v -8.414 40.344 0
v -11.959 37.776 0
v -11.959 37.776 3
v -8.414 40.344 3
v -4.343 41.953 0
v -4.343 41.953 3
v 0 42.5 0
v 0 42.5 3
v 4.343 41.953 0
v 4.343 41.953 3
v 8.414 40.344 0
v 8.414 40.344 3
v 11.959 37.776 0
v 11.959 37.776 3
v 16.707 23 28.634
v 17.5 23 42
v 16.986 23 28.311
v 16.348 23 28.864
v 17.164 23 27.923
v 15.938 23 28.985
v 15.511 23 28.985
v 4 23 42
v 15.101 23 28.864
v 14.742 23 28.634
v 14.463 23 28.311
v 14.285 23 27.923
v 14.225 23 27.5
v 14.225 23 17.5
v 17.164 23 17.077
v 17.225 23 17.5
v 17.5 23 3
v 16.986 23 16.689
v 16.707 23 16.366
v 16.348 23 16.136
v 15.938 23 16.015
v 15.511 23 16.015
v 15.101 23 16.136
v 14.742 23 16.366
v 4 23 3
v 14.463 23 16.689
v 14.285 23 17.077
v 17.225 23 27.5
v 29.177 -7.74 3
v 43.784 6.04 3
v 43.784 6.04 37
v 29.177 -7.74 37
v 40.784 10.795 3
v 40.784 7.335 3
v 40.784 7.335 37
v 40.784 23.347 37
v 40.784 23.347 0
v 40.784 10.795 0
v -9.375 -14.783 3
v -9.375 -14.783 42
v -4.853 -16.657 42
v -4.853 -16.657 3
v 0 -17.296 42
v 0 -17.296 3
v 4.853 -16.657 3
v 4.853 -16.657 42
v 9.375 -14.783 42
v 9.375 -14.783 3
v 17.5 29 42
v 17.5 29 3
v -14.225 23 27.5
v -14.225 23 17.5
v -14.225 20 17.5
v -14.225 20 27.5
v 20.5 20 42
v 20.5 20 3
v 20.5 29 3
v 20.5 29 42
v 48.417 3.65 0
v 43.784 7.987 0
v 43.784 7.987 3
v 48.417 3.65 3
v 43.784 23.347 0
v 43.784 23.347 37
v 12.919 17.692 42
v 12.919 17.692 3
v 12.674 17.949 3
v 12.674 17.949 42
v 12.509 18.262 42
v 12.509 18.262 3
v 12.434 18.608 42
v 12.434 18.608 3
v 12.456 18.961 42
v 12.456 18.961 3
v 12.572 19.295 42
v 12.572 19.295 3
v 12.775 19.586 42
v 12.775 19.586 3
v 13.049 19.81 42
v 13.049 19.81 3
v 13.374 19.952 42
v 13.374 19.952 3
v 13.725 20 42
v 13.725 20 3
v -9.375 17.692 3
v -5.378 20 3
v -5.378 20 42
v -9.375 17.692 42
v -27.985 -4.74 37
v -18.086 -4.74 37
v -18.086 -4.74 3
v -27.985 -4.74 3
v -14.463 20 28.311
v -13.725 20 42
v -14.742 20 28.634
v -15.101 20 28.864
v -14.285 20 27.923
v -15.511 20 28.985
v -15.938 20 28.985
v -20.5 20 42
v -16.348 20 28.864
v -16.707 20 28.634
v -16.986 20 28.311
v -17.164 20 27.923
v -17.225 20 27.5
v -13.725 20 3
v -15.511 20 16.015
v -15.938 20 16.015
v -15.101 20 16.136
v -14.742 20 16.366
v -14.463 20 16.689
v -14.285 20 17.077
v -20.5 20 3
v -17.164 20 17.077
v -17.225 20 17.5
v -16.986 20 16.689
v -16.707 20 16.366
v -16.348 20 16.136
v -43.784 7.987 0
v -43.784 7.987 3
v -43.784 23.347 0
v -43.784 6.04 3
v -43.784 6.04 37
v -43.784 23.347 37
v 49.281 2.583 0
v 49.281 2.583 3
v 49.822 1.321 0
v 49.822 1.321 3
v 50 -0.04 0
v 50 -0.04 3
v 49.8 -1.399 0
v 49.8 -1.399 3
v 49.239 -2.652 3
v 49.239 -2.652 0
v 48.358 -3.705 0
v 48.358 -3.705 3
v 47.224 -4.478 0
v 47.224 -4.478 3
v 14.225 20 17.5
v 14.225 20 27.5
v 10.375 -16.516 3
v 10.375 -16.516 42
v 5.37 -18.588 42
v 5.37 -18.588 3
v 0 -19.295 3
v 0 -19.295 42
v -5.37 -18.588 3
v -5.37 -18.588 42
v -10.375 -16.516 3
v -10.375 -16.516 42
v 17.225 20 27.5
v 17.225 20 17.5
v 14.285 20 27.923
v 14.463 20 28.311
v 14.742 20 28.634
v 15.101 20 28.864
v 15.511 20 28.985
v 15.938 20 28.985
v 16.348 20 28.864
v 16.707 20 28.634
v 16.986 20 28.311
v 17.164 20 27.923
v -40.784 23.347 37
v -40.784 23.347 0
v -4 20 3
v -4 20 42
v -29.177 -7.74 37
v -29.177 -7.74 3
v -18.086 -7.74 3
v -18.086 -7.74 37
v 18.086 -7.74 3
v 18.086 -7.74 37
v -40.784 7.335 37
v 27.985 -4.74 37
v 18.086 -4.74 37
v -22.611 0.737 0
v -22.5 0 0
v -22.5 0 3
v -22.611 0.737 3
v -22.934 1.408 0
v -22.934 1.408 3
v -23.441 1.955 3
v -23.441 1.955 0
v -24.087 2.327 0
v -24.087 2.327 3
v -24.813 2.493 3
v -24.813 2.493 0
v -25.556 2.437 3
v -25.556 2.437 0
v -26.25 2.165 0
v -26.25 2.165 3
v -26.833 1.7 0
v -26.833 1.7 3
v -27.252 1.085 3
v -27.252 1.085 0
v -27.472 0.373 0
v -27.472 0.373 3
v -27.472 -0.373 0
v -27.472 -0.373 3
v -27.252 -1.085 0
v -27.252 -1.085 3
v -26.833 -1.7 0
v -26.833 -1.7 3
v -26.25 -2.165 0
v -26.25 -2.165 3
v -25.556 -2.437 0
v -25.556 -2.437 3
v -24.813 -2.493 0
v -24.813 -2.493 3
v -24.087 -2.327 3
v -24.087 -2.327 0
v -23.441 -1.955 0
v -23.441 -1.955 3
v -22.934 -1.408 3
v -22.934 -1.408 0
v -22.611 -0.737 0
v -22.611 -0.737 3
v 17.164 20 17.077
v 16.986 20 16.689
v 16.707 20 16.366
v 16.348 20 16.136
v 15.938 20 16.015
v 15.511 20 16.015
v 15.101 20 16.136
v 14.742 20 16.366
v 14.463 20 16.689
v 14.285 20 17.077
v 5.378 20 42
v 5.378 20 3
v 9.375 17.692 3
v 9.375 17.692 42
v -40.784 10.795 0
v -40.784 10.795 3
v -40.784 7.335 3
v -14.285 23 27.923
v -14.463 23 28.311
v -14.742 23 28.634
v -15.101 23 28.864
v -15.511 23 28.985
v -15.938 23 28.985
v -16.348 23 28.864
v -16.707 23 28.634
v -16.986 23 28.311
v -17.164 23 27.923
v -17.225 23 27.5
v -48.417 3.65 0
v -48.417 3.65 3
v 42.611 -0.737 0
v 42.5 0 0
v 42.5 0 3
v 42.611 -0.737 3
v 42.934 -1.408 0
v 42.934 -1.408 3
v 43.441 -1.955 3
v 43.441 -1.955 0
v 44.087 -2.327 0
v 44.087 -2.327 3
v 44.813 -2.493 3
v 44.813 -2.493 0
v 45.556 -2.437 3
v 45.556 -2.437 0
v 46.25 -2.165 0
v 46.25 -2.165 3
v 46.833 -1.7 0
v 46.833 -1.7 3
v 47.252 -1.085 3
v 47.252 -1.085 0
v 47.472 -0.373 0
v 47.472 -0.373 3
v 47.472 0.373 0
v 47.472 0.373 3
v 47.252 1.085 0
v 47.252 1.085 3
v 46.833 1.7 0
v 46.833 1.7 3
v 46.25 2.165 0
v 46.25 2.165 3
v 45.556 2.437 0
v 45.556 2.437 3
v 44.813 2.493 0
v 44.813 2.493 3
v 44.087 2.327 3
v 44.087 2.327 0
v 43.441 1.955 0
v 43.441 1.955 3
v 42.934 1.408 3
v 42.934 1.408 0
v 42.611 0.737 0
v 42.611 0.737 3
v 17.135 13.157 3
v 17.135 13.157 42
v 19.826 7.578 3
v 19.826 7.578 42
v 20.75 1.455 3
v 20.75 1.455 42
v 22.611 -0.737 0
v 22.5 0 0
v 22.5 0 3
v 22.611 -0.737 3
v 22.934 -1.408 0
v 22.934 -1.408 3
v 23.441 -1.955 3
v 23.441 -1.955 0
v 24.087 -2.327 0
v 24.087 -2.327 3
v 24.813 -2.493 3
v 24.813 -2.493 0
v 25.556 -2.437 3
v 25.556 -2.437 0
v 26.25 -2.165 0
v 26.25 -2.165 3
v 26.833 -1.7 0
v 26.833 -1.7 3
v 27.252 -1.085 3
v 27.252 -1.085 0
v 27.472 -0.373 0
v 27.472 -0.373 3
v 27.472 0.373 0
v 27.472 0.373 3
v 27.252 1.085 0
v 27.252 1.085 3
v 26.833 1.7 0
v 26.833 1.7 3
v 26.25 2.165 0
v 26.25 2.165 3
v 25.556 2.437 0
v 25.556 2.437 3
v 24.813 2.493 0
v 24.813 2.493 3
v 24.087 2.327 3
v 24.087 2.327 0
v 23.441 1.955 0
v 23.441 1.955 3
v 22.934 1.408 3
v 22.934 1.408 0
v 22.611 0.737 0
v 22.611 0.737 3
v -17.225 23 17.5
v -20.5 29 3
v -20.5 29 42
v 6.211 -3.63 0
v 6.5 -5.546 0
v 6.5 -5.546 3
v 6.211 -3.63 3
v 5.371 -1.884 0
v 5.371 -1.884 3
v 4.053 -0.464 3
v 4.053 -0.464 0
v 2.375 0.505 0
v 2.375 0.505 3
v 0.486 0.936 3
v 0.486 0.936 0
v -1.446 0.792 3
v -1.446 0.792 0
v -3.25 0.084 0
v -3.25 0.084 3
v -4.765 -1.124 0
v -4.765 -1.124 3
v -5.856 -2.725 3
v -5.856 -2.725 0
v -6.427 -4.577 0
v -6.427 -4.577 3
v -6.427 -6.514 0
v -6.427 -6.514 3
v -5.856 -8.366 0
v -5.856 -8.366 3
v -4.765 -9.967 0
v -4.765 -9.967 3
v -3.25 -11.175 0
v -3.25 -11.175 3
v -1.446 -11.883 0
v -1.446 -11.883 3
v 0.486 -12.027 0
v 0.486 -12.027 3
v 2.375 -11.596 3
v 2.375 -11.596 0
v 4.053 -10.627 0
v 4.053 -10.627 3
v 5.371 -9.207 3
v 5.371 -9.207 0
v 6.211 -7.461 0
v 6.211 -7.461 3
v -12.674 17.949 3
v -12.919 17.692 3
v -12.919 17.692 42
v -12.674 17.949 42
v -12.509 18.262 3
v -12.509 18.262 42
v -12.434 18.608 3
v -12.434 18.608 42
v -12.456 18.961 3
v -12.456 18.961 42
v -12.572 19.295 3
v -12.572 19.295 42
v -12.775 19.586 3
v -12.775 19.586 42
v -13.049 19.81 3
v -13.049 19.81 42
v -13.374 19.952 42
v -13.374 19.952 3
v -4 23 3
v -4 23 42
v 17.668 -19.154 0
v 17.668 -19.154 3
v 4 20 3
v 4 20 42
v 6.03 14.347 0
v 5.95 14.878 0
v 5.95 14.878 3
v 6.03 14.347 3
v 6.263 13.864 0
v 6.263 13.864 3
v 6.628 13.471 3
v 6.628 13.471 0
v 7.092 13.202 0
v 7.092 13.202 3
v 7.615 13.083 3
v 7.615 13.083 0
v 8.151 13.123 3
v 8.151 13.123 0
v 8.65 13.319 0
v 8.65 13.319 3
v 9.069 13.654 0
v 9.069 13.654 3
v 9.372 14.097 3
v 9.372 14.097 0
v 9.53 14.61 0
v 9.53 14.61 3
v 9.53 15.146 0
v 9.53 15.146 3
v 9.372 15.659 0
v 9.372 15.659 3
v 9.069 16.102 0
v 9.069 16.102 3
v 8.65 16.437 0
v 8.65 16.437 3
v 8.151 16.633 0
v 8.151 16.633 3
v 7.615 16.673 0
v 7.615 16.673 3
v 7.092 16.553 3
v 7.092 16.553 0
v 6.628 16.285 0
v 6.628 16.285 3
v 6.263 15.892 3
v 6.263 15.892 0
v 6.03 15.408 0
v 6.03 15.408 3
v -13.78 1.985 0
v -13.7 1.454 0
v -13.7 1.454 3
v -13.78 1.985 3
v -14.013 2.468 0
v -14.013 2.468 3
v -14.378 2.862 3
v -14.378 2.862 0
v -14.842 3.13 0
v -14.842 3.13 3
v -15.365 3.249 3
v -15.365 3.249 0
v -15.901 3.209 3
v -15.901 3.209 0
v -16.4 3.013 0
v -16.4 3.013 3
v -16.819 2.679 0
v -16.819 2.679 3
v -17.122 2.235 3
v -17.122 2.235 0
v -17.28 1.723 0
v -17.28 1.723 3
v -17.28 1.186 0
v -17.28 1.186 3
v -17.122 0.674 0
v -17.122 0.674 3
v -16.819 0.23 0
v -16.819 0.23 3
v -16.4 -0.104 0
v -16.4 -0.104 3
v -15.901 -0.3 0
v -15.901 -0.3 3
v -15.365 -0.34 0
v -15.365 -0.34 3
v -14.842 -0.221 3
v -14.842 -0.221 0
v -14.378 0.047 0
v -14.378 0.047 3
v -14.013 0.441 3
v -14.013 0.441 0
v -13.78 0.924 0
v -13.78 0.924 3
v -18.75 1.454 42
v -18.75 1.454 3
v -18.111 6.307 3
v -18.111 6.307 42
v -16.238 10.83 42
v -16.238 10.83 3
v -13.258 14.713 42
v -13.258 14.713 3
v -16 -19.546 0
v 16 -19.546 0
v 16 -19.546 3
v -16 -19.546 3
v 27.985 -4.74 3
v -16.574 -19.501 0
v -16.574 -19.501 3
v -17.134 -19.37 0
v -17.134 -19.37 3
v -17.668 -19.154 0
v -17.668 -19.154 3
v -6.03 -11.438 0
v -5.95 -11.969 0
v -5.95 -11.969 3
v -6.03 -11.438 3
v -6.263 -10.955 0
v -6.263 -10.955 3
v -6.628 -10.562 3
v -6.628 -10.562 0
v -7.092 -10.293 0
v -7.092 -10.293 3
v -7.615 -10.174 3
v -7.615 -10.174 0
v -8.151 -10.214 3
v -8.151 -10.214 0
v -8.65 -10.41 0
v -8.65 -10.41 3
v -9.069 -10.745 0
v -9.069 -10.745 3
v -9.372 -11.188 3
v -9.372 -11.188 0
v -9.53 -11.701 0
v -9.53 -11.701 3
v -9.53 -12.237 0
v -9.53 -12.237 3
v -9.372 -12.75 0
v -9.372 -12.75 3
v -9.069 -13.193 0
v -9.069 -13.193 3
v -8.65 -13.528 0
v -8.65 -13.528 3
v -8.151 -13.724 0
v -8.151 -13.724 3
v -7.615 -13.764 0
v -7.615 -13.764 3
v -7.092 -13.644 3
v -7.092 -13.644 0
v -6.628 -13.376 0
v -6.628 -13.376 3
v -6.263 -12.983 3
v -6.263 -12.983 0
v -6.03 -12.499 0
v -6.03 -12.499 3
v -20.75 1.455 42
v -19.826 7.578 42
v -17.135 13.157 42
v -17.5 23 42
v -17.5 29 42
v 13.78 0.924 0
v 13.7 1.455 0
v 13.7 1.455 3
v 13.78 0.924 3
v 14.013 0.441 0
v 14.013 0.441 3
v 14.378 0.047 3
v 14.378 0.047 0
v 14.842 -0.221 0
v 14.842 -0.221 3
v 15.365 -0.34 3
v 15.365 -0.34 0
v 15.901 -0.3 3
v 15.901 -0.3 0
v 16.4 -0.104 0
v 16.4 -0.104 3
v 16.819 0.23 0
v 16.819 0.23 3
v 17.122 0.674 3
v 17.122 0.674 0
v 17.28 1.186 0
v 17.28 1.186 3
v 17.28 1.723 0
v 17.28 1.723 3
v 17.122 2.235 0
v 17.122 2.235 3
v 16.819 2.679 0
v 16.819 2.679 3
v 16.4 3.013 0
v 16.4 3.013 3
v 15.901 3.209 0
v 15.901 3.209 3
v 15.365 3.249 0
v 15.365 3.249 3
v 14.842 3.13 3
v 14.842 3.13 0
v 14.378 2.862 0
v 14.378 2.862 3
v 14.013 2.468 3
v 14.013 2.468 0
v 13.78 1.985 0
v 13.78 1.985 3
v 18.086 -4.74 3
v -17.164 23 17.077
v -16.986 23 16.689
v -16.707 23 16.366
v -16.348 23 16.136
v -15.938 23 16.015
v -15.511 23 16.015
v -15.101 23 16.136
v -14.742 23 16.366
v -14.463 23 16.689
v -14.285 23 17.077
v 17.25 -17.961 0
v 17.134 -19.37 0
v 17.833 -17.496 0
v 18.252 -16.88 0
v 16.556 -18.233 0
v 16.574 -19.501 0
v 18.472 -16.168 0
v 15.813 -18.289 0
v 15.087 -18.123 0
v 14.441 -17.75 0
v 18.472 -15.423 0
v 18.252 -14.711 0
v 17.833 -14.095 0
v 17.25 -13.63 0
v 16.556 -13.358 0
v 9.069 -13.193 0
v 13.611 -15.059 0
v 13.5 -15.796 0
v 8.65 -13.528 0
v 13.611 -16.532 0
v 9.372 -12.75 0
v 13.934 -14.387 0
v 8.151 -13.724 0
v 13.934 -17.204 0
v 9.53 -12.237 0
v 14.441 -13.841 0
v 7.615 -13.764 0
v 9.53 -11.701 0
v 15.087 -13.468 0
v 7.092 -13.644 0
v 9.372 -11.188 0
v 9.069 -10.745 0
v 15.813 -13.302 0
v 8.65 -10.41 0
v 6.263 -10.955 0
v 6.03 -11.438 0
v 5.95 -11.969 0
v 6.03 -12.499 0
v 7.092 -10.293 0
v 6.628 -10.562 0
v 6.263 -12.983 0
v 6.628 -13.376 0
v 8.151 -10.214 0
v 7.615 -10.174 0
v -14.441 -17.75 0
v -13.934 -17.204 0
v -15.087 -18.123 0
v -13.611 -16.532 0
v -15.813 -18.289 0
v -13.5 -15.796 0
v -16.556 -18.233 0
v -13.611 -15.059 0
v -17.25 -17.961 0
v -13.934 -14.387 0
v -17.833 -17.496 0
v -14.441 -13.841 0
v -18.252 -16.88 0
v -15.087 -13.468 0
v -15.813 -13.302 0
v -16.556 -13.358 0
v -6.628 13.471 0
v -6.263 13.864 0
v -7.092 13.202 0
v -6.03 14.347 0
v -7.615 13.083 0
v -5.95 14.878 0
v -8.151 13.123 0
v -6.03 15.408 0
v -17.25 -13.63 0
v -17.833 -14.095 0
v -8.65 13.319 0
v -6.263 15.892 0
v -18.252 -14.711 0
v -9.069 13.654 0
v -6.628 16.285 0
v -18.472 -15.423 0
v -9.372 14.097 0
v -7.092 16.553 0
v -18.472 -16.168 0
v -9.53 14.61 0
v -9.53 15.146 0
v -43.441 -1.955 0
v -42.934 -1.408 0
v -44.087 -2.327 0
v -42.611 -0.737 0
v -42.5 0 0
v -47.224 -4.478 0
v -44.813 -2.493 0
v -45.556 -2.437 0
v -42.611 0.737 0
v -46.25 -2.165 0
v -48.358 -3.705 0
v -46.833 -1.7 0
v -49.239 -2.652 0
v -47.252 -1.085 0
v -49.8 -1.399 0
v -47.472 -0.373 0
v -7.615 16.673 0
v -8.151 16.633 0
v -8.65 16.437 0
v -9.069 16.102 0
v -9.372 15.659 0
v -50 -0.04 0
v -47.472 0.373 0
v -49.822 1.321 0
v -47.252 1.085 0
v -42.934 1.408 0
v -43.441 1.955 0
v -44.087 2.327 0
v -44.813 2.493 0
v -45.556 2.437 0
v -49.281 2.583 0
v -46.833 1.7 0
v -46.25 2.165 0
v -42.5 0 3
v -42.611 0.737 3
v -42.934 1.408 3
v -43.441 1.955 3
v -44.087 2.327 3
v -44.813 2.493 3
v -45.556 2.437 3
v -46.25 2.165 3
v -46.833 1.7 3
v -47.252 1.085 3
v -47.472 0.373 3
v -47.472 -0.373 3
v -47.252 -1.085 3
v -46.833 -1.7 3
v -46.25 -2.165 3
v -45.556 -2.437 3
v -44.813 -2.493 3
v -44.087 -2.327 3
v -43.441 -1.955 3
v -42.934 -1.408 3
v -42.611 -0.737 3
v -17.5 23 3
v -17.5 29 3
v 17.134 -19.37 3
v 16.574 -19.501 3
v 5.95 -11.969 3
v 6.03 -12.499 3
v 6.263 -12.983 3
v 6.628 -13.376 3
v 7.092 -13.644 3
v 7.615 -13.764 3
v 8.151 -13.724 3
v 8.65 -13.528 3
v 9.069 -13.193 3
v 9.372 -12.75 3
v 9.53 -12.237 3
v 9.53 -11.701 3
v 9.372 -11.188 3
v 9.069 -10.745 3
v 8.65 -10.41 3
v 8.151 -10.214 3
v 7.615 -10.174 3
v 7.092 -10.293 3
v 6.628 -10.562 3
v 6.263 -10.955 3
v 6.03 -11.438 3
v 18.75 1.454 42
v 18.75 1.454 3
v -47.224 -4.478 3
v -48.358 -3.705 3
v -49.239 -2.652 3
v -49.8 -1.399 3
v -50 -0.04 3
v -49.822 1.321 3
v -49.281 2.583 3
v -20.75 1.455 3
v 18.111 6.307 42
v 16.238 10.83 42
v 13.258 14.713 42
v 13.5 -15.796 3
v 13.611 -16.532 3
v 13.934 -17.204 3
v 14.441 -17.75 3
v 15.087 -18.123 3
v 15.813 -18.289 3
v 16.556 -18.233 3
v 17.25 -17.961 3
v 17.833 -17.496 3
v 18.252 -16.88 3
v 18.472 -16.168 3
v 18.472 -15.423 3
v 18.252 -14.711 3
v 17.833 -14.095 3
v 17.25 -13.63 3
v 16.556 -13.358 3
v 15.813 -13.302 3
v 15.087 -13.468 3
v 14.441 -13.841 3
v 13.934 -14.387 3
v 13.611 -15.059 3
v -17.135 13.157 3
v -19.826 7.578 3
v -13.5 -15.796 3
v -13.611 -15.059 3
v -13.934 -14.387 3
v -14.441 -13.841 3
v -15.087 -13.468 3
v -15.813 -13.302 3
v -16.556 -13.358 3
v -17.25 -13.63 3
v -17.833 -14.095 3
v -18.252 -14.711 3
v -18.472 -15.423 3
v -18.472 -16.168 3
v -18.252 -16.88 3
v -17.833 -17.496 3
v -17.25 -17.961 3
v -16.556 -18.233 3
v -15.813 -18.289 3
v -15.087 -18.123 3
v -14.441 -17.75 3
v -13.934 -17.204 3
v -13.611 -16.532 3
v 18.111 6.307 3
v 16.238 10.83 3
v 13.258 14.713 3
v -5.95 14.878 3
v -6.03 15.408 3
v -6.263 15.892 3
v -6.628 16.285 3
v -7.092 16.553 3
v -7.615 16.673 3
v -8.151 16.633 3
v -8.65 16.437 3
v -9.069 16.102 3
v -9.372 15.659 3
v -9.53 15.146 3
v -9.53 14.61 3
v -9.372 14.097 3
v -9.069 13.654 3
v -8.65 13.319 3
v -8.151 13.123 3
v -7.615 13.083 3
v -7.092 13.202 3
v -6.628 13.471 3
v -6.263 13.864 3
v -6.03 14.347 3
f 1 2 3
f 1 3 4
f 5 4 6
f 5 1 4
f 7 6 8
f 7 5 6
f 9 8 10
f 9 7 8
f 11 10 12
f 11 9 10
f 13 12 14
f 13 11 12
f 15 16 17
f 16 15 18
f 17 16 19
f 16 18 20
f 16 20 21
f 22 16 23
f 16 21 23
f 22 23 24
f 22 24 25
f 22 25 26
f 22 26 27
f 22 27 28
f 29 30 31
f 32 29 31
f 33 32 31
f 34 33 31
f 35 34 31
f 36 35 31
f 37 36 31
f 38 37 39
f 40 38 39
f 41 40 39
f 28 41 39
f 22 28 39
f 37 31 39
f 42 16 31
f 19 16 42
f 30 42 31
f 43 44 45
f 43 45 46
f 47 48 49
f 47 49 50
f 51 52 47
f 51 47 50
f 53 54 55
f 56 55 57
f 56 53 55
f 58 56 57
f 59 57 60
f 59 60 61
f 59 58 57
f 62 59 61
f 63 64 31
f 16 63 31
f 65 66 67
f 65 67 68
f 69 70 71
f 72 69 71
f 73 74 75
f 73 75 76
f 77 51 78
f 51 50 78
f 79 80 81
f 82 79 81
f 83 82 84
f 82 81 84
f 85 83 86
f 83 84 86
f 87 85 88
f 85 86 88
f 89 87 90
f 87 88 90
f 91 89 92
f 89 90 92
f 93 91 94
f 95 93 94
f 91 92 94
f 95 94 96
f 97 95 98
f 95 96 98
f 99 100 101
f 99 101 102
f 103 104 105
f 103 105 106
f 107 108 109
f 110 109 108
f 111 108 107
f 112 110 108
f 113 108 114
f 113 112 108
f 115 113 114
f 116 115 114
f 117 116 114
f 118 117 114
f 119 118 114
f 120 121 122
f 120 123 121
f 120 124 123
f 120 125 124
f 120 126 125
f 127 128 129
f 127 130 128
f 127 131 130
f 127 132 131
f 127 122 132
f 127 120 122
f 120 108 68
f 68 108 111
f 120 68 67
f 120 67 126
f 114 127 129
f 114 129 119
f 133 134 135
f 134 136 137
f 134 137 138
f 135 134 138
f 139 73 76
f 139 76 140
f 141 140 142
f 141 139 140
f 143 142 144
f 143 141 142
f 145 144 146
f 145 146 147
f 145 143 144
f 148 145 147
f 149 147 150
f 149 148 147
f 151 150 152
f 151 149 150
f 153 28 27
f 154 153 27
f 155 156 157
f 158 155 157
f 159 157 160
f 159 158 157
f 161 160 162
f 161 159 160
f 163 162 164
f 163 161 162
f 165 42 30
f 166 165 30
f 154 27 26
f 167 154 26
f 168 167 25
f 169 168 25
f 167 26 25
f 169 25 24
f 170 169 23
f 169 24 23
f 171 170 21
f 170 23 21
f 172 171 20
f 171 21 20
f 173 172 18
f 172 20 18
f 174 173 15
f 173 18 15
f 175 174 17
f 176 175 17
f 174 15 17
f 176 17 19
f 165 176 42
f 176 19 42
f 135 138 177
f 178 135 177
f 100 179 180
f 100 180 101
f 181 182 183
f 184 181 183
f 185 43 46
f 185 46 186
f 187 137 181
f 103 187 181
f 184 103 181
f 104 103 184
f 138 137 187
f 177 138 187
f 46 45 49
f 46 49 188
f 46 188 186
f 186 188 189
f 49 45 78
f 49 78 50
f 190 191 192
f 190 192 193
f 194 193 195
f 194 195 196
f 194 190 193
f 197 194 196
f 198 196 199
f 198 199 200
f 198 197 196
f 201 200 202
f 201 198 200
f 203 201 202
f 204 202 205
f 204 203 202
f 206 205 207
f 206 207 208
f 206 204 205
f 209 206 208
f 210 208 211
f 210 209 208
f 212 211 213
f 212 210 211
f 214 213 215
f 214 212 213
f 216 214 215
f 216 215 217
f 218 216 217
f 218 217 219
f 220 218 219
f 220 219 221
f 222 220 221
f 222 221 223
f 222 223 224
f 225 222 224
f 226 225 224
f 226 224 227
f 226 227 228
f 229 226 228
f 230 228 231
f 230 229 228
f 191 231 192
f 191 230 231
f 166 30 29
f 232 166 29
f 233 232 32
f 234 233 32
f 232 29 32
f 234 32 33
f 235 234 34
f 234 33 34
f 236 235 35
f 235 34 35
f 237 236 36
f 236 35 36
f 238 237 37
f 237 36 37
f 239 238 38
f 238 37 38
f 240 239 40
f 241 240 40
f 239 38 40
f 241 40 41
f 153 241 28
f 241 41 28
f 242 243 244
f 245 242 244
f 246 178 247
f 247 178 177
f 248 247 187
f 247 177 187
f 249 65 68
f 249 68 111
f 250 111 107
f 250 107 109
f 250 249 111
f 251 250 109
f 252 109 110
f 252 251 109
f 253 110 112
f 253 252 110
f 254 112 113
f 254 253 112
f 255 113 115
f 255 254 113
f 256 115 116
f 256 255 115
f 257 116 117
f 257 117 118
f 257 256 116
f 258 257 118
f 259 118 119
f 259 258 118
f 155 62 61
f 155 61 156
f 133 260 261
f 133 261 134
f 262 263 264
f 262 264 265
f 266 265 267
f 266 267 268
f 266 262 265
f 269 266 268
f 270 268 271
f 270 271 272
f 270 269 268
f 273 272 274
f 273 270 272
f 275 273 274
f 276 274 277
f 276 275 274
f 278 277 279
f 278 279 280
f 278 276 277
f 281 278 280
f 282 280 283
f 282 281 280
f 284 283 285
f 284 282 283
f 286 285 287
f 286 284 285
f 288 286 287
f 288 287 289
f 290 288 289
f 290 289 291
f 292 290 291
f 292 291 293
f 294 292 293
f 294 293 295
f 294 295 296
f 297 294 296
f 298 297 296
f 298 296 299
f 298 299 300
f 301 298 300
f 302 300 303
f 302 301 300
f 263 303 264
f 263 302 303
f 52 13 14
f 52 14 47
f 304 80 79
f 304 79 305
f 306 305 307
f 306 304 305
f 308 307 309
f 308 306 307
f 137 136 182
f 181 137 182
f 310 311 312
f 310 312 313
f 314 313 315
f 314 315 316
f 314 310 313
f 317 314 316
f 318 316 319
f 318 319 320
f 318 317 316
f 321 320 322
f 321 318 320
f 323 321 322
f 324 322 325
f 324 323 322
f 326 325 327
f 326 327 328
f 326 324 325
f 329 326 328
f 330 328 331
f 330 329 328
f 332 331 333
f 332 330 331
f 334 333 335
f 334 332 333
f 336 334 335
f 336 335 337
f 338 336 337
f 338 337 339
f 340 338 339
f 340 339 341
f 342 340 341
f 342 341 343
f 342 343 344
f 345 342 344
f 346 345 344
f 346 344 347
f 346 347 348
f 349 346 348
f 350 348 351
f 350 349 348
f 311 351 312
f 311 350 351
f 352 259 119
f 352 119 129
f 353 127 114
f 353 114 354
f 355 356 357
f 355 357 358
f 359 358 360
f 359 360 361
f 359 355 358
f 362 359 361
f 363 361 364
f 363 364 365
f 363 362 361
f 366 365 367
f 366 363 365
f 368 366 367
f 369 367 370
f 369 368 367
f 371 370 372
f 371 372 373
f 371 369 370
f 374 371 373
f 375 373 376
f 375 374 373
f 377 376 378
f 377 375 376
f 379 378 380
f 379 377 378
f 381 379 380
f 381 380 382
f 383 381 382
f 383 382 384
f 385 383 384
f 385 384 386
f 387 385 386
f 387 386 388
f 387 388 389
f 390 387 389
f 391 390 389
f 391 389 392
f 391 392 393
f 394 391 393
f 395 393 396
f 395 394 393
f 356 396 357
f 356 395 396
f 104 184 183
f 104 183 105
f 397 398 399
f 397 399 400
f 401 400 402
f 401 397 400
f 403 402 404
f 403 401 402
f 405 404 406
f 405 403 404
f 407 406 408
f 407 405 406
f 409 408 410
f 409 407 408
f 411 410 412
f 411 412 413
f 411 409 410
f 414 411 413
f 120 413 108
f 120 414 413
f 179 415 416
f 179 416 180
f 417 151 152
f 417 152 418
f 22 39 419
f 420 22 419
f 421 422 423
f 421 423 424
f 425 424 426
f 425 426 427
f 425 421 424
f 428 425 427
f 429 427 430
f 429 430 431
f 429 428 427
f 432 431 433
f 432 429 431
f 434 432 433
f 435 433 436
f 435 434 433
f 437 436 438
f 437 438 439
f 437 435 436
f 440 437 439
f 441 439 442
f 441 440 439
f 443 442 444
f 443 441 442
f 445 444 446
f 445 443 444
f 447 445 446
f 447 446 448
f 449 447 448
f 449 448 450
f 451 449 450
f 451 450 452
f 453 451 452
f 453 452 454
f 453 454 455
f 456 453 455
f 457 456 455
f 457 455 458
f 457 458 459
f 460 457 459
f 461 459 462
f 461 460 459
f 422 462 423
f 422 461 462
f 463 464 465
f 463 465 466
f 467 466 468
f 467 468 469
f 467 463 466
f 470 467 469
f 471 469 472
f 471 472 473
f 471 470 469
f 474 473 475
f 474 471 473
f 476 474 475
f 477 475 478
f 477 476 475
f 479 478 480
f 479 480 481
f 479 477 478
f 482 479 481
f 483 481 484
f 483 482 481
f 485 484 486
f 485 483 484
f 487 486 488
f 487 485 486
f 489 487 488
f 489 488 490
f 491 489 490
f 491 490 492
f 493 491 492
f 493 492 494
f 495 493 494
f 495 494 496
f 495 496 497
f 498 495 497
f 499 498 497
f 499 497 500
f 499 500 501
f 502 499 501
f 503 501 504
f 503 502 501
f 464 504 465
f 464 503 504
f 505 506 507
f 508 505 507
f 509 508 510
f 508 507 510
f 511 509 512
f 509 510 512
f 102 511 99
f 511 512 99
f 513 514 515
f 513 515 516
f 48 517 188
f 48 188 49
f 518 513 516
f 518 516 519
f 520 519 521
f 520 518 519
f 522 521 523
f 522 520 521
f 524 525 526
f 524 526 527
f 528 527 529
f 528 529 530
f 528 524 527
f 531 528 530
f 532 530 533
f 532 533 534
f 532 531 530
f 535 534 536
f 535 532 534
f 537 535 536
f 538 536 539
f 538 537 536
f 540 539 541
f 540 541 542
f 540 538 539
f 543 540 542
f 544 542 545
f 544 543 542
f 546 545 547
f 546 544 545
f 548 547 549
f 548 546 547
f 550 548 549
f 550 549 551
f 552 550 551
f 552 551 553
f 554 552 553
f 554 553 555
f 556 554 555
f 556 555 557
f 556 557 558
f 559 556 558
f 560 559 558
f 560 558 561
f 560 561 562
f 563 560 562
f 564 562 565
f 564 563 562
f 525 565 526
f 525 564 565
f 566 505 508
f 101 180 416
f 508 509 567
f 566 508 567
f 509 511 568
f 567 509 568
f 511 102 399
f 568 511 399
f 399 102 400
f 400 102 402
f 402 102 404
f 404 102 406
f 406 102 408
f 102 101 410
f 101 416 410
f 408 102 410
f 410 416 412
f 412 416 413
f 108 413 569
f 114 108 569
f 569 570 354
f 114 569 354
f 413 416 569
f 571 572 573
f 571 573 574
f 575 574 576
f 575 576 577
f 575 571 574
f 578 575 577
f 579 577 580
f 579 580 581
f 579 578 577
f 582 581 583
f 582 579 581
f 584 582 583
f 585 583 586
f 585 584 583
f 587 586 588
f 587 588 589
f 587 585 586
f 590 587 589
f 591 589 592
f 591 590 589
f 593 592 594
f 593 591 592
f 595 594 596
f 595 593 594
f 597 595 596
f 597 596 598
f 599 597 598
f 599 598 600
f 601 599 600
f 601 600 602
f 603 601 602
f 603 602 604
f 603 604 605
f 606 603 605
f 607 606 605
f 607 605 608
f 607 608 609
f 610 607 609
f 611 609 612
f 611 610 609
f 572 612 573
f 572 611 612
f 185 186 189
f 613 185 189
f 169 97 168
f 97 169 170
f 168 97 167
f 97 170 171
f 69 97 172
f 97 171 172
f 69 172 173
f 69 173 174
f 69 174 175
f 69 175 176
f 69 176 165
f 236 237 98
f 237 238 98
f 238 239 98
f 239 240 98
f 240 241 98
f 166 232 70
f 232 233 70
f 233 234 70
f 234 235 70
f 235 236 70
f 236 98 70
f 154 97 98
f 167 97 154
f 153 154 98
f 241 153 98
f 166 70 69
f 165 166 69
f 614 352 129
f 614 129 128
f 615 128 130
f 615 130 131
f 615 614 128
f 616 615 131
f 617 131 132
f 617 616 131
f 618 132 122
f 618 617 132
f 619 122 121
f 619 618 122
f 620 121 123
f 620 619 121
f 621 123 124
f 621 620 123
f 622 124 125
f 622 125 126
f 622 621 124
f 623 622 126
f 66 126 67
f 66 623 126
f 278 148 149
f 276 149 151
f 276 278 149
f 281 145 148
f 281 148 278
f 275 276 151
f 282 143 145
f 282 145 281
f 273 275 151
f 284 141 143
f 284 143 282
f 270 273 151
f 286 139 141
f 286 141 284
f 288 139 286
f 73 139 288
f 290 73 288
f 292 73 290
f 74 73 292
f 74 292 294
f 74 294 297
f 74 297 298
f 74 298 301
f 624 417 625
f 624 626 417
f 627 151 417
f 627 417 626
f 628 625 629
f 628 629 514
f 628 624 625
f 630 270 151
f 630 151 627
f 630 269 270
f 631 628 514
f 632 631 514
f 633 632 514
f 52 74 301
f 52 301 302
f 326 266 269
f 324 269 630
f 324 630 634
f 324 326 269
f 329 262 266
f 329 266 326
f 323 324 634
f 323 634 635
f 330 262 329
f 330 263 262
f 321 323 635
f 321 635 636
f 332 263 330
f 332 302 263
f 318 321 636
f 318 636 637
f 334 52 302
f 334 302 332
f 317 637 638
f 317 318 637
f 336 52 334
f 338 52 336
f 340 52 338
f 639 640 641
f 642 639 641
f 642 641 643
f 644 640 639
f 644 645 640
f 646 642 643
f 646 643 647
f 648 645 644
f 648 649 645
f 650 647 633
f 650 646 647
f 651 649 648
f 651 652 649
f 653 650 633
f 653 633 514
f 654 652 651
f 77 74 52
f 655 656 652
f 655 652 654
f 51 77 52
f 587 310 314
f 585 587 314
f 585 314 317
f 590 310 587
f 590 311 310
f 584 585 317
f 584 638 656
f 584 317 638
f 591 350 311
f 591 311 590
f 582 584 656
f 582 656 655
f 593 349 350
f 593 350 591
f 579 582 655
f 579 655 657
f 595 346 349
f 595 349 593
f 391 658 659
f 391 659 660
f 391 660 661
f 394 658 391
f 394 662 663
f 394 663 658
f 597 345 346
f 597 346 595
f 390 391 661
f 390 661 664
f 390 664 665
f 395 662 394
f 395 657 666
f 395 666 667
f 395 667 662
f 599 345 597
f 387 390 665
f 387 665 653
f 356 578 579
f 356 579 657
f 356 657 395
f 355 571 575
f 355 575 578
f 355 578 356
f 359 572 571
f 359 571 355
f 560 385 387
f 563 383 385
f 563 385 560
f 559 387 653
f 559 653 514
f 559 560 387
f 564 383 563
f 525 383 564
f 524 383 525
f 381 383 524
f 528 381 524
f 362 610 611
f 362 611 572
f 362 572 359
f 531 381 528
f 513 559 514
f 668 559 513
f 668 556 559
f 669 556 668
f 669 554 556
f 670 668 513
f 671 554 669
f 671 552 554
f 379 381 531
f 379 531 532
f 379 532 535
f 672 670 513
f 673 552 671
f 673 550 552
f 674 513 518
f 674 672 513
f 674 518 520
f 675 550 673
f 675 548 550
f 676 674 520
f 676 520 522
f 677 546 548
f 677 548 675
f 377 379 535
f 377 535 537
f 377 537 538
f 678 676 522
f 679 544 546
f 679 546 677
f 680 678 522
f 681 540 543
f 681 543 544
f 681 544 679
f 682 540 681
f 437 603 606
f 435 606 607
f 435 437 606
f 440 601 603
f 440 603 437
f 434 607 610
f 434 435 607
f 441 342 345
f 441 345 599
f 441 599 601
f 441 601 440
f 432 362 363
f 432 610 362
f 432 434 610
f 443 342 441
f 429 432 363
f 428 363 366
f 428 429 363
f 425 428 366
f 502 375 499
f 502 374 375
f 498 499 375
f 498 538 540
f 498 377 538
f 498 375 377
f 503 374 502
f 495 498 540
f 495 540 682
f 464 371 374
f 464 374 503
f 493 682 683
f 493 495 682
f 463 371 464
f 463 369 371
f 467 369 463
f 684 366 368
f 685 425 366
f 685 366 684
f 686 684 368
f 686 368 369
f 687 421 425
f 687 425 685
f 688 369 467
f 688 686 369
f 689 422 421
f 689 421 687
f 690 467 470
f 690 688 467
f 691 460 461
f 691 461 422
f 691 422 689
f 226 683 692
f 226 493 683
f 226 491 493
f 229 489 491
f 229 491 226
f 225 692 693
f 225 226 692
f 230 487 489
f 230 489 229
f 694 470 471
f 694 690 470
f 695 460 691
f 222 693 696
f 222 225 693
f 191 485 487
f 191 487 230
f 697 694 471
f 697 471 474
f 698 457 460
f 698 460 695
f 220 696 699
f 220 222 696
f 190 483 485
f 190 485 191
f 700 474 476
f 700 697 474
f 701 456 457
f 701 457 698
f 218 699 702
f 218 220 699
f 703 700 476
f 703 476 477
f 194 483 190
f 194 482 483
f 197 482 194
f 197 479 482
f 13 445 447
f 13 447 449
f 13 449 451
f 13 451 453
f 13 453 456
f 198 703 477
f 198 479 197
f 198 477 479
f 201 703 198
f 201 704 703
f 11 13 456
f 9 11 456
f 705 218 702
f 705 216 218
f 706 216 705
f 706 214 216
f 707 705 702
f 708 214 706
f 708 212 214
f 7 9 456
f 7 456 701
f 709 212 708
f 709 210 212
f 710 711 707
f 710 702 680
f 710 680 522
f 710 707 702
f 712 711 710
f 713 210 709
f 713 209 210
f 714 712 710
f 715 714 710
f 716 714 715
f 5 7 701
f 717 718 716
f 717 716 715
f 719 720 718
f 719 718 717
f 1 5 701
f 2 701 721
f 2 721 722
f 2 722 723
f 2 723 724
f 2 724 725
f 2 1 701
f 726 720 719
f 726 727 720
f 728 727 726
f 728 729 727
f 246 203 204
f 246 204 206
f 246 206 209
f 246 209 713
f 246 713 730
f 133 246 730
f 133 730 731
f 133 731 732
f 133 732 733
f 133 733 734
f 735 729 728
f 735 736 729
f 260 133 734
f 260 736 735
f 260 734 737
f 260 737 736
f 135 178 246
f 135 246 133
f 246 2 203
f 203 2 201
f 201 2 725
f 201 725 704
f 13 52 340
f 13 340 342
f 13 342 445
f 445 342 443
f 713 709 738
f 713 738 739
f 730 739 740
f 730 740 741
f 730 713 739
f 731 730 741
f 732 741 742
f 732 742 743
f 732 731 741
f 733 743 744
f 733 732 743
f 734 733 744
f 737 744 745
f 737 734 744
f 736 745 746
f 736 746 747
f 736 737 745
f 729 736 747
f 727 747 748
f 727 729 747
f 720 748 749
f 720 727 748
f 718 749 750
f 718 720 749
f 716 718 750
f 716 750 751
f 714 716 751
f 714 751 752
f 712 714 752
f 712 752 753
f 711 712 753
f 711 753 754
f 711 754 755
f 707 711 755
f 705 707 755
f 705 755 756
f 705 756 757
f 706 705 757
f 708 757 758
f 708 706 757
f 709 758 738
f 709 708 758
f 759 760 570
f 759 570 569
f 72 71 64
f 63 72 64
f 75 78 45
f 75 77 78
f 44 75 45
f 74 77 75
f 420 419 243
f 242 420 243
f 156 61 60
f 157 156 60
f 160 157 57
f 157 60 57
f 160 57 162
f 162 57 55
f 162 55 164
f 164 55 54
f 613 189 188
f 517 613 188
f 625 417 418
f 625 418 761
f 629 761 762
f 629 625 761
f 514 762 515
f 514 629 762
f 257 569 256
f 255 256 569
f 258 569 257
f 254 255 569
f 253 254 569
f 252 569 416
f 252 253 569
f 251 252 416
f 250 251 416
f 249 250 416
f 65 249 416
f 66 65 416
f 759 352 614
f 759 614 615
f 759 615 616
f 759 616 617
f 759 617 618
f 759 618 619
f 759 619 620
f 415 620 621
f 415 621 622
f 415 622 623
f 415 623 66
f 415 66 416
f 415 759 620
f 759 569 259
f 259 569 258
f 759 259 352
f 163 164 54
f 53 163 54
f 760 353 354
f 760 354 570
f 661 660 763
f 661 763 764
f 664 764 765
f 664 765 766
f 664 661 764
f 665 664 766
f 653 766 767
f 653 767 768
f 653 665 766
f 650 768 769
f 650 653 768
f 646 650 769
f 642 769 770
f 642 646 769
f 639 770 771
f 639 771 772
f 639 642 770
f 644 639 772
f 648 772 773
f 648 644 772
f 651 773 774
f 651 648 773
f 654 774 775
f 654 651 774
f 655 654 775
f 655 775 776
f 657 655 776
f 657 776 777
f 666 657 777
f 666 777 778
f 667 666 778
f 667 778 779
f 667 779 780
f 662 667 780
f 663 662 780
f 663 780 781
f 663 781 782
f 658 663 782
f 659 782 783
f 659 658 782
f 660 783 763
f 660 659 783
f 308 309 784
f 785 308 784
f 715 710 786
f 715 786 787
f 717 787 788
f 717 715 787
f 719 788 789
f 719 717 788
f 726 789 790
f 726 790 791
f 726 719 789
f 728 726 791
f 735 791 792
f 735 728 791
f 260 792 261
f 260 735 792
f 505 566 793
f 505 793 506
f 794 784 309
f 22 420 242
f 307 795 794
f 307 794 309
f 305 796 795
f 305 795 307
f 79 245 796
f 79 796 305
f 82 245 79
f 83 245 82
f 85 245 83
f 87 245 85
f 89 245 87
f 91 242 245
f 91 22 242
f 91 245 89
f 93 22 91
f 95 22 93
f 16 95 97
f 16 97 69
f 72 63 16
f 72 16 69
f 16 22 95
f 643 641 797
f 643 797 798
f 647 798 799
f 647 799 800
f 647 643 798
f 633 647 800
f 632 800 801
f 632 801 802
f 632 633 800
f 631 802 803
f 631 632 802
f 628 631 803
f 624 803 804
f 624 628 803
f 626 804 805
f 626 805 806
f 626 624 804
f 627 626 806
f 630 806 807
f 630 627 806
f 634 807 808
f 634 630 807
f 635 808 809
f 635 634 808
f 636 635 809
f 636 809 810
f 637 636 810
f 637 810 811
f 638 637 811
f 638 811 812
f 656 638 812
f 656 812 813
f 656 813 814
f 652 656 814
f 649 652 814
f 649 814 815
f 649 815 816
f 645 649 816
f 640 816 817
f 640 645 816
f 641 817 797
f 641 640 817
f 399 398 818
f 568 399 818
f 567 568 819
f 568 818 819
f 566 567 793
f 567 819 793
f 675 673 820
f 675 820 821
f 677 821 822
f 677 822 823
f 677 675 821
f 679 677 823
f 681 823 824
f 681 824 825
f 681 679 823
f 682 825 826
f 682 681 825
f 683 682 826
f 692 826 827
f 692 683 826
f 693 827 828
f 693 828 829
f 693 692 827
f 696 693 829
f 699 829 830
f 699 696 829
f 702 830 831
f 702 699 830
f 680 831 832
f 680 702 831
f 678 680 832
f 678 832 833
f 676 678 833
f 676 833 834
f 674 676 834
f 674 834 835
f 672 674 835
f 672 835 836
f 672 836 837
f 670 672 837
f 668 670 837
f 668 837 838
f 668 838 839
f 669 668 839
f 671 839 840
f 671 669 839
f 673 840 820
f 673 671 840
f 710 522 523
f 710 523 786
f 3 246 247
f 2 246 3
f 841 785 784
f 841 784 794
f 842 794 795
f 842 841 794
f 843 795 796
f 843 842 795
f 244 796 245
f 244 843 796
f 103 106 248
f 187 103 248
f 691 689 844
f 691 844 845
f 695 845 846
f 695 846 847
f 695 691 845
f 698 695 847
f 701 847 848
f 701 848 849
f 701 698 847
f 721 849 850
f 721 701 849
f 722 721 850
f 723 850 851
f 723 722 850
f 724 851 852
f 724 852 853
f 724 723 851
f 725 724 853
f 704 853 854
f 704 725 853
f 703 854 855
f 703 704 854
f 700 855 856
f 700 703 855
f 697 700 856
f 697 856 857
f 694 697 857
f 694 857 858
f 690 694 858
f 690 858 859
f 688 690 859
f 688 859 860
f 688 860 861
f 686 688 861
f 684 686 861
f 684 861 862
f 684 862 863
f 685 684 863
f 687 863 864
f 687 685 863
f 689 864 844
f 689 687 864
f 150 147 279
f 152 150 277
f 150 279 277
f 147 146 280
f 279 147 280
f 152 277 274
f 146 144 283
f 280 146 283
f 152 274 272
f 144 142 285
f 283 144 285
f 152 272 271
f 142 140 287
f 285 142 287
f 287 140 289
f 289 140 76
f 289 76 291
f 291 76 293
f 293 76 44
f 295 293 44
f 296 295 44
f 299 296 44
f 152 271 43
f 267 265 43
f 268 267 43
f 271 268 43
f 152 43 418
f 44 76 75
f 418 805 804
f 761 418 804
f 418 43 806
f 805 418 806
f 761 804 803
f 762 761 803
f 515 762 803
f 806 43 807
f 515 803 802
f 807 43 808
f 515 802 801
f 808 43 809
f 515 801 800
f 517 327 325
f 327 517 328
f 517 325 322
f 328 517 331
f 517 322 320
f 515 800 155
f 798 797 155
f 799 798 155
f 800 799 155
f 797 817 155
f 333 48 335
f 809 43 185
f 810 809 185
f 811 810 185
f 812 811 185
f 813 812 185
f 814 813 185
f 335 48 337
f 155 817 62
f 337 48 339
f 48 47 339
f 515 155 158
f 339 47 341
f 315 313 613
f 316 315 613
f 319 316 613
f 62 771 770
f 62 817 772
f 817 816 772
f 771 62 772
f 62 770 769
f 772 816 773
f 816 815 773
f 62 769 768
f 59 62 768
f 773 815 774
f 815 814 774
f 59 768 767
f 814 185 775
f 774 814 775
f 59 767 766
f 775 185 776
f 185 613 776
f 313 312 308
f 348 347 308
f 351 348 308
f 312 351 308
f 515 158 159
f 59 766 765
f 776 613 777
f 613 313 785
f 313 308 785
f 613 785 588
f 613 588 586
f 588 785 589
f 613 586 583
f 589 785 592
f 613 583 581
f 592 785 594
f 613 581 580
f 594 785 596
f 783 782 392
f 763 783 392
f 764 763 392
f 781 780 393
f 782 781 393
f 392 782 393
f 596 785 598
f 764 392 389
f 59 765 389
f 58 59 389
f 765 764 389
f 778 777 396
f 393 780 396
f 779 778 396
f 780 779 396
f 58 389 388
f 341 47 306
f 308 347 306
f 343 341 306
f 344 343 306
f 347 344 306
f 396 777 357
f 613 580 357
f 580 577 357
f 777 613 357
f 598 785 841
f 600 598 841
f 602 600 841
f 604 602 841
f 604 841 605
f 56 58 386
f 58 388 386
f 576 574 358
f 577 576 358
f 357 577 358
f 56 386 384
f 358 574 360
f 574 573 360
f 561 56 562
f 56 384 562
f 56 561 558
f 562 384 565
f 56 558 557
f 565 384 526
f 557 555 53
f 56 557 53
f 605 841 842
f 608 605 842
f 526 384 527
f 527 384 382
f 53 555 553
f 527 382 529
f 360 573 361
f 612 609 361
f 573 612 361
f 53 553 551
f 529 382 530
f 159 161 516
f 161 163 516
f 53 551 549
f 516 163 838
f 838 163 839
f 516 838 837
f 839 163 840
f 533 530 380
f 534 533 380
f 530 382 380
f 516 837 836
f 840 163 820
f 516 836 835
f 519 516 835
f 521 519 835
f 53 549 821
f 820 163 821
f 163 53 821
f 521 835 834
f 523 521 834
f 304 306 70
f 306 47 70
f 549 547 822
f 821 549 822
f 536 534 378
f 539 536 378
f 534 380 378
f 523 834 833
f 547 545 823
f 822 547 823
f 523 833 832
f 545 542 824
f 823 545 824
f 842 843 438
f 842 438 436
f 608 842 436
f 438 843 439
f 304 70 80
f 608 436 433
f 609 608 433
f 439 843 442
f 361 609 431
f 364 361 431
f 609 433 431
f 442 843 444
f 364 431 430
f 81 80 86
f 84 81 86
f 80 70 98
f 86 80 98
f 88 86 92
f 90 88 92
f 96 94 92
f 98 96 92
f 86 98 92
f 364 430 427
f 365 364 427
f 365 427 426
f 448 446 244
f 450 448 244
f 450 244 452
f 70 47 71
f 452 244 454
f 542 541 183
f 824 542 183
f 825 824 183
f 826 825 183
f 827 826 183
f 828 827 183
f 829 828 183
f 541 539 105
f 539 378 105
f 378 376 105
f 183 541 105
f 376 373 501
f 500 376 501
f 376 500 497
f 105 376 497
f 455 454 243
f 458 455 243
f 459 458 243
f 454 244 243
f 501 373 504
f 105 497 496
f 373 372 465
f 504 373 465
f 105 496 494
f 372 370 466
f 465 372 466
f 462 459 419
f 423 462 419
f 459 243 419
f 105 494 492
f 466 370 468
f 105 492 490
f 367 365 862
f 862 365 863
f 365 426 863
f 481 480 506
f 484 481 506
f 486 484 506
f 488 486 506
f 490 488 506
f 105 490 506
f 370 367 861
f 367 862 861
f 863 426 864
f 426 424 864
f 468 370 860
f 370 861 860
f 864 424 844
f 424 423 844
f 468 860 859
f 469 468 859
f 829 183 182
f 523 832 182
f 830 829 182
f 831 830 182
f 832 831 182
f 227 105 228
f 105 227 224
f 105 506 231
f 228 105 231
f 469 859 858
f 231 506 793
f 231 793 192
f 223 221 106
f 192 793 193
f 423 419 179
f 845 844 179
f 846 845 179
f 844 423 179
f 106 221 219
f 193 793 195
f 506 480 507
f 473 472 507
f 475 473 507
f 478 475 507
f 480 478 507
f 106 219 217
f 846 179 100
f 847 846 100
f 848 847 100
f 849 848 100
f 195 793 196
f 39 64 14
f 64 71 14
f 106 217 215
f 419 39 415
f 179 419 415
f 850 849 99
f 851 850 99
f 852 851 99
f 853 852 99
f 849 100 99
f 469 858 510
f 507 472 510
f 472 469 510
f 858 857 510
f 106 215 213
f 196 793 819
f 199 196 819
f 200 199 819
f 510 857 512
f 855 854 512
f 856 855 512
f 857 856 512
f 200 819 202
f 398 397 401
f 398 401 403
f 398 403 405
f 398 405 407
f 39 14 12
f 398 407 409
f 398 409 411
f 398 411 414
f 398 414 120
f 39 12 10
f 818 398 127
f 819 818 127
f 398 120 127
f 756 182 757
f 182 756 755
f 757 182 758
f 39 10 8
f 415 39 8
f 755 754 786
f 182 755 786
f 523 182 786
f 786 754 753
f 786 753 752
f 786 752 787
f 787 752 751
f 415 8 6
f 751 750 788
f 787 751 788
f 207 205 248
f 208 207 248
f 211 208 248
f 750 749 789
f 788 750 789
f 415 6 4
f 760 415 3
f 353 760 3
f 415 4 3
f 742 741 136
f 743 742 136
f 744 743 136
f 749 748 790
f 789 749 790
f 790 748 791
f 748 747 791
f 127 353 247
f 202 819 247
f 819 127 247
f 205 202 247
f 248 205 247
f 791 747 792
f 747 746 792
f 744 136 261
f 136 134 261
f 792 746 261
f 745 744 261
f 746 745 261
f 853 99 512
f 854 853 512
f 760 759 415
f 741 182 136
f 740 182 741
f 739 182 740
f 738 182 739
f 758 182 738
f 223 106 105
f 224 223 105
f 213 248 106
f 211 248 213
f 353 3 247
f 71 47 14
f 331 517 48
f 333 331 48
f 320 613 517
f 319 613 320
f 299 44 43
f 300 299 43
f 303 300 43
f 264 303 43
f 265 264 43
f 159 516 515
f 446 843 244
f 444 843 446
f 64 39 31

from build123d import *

# Parameters (mm, degrees)
SKETCH1_R           = 2.5
SKETCH1_R_2         = 6.5
SKETCH1_R_3         = 1.8
BOSS_EXTRUDE1_DEPTH = 3
BOSS_EXTRUDE2_DEPTH = 39
BOSS_EXTRUDE3_DEPTH = 39
CUT_EXTRUDE1_DEPTH  = 3
BOSS_EXTRUDE4_DEPTH = 34
BOSS_EXTRUDE5_DEPTH = 3


with BuildPart() as part:
    # Sketch1 → Boss-Extrude1 (new body)
    with BuildSketch(Plane.XY):
        with BuildLine():
            Line((-48.416861363, 3.650350453), (-11.959014769, 37.776226585))
            ThreePointArc((-11.959014769, 37.776226585), (0, 42.5), (11.959014769, 37.776226585))
            Line((11.959014769, 37.776226585), (48.416861363, 3.650350453))
            ThreePointArc((48.416861363, 3.650350453), (49.946989961, -0.726147591), (47.22369092, -4.478303104))
            Line((47.22369092, -4.478303104), (17.66776819, -19.154227328))
            ThreePointArc((17.66776819, -19.154227328), (16.856525691, -19.446371641), (16, -19.5455))
            Line((16, -19.5455), (-16, -19.5455))
            ThreePointArc((-16, -19.5455), (-16.856525691, -19.446371641), (-17.66776819, -19.154227328))
            Line((-17.66776819, -19.154227328), (-47.22369092, -4.478303104))
            ThreePointArc((-47.22369092, -4.478303104), (-49.946989961, -0.726147591), (-48.416861363, 3.650350453))
        make_face()
        with Locations((-25, 0)):
            Circle(SKETCH1_R, mode=Mode.SUBTRACT)
        with Locations((0, -5.5455)):
            Circle(SKETCH1_R_2, mode=Mode.SUBTRACT)
        with Locations((-7.75, 14.877893759)):
            Circle(SKETCH1_R_3, mode=Mode.SUBTRACT)
        with Locations((-15.5, 1.4545)):
            Circle(SKETCH1_R_3, mode=Mode.SUBTRACT)
        with Locations((-7.75, -11.968893759)):
            Circle(SKETCH1_R_3, mode=Mode.SUBTRACT)
        with Locations(Location((7.75, -11.968893759, 0), (0, 0, 180))):
            Circle(SKETCH1_R_3, mode=Mode.SUBTRACT)
        with Locations(Location((7.75, 14.877893759, 0), (0, 0, 180))):
            Circle(SKETCH1_R_3, mode=Mode.SUBTRACT)
        with Locations(Location((15.5, 1.4545, 0), (0, 0, 180))):
            Circle(SKETCH1_R_3, mode=Mode.SUBTRACT)
        with Locations(Location((25, 0, 0), (0, 0, 180))):
            Circle(SKETCH1_R, mode=Mode.SUBTRACT)
        with Locations((-45, 0)):
            Circle(SKETCH1_R, mode=Mode.SUBTRACT)
        with Locations(Location((45, 0, 0), (0, 0, 180))):
            Circle(SKETCH1_R, mode=Mode.SUBTRACT)
        with Locations((-16, -15.7955)):
            Circle(SKETCH1_R, mode=Mode.SUBTRACT)
        with Locations(Location((16, -15.7955, 0), (0, 0, 180))):
            Circle(SKETCH1_R, mode=Mode.SUBTRACT)
    extrude(amount=BOSS_EXTRUDE1_DEPTH)

    # Sketch2 → Boss-Extrude2 (add)
    with BuildSketch(Plane.XY.offset(3)):
        with BuildLine():
            Line((-20.75, 1.4545), (-18.75, 1.4545))
            ThreePointArc((-18.75, 1.4545), (-16.237976321, 10.8295), (-9.375, 17.692476321))
            Line((-9.375, 17.692476321), (-10.375, 19.424527129))
            ThreePointArc((-10.375, 19.424527129), (-17.970027129, 11.8295), (-20.75, 1.4545))
        make_face()
        with BuildLine():
            Line((-10.375, -16.515527129), (-9.375, -14.783476321))
            ThreePointArc((-9.375, -14.783476321), (0, -17.2955), (9.375, -14.783476321))
            Line((9.375, -14.783476321), (10.375, -16.515527129))
            ThreePointArc((10.375, -16.515527129), (0, -19.2955), (-10.375, -16.515527129))
        make_face()
        with BuildLine():
            ThreePointArc((18.75, 1.4545), (16.237976321, 10.8295), (9.375, 17.692476321))
            Line((9.375, 17.692476321), (10.375, 19.424527129))
            ThreePointArc((10.375, 19.424527129), (17.970027129, 11.8295), (20.75, 1.4545))
            Line((20.75, 1.4545), (18.75, 1.4545))
        make_face()
    extrude(amount=BOSS_EXTRUDE2_DEPTH)

    # Sketch3 → Boss-Extrude3 (add)
    with BuildSketch(Plane.XY.offset(3)):
        with BuildLine():
            Line((-17.5, 29), (-17.5, 23))
            Line((-17.5, 23), (-4, 23))
            Line((-4, 23), (-4, 20))
            Line((-4, 20), (-5.378251748, 20))
            Line((-5.378251748, 20), (-9.375, 17.692476321))
            Line((-9.375, 17.692476321), (-12.918615444, 17.692476321))
            ThreePointArc((-12.918615444, 17.692476321), (-12.502444344, 19.132335325), (-13.724553319, 20))
            Line((-13.724553319, 20), (-20.5, 20))
            Line((-20.5, 20), (-20.5, 29))
            Line((-20.5, 29), (-17.5, 29))
        make_face()
    boss_extrude3 = extrude(amount=BOSS_EXTRUDE3_DEPTH)

    # Mirror1: Boss-Extrude3 across plane
    add(boss_extrude3.mirror(Plane(origin=(0, 0, 0), x_dir=(0, 0, 1), z_dir=(1, 0, 0))))

    # Sketch4 → Cut-Extrude1 (cut)
    with BuildSketch(Plane(origin=(0, 23, 0), x_dir=(1, 0, 0), z_dir=(0, 1, 0))):
        with BuildLine():
            Line((-14.224553319, -17.5), (-14.224553319, -27.5))
            ThreePointArc((-14.224553319, -27.5), (-15.724553319, -29), (-17.224553319, -27.5))
            Line((-17.224553319, -27.5), (-17.224553319, -17.5))
            ThreePointArc((-17.224553319, -17.5), (-15.724553319, -16), (-14.224553319, -17.5))
        make_face()
        with BuildLine():
            Line((14.224553319, -17.5), (14.224553319, -27.5))
            ThreePointArc((14.224553319, -27.5), (15.724553319, -29), (17.224553319, -27.5))
            Line((17.224553319, -27.5), (17.224553319, -17.5))
            ThreePointArc((17.224553319, -17.5), (15.724553319, -16), (14.224553319, -17.5))
        make_face()
    extrude(amount=-CUT_EXTRUDE1_DEPTH, mode=Mode.SUBTRACT)

    # Sketch5 → Boss-Extrude4 (add)
    with BuildSketch(Plane.XY.offset(3)):
        Polygon((-43.784396435, 23.346849864), (-43.784396435, 6.040412882), (-29.176551712, -7.739510205), (-18.086117895, -7.739510205), (-18.086117895, -4.739510205), (-27.984845454, -4.739510205), (-40.784396435, 7.334606915), (-40.784396435, 23.346849864), align=None)
    boss_extrude4 = extrude(amount=BOSS_EXTRUDE4_DEPTH)

    # Mirror2: Boss-Extrude4 across plane
    add(boss_extrude4.mirror(Plane(origin=(0, 0, 0), x_dir=(0, 0, 1), z_dir=(1, 0, 0))))

    # Sketch6 → Boss-Extrude5 (add)
    with BuildSketch(Plane(origin=(0, 0, 3), x_dir=(-1, 0, 0), z_dir=(0, 0, -1))):
        Polygon((40.784396435, 23.346849864), (40.784396435, 10.794616422), (43.784396435, 7.986506839), (43.784396435, 23.346849864), align=None)
        Polygon((-43.784396435, 23.346849864), (-43.784396435, 7.986506839), (-40.784396435, 10.794616422), (-40.784396435, 23.346849864), align=None)
    extrude(amount=BOSS_EXTRUDE5_DEPTH)


solid = part.part
